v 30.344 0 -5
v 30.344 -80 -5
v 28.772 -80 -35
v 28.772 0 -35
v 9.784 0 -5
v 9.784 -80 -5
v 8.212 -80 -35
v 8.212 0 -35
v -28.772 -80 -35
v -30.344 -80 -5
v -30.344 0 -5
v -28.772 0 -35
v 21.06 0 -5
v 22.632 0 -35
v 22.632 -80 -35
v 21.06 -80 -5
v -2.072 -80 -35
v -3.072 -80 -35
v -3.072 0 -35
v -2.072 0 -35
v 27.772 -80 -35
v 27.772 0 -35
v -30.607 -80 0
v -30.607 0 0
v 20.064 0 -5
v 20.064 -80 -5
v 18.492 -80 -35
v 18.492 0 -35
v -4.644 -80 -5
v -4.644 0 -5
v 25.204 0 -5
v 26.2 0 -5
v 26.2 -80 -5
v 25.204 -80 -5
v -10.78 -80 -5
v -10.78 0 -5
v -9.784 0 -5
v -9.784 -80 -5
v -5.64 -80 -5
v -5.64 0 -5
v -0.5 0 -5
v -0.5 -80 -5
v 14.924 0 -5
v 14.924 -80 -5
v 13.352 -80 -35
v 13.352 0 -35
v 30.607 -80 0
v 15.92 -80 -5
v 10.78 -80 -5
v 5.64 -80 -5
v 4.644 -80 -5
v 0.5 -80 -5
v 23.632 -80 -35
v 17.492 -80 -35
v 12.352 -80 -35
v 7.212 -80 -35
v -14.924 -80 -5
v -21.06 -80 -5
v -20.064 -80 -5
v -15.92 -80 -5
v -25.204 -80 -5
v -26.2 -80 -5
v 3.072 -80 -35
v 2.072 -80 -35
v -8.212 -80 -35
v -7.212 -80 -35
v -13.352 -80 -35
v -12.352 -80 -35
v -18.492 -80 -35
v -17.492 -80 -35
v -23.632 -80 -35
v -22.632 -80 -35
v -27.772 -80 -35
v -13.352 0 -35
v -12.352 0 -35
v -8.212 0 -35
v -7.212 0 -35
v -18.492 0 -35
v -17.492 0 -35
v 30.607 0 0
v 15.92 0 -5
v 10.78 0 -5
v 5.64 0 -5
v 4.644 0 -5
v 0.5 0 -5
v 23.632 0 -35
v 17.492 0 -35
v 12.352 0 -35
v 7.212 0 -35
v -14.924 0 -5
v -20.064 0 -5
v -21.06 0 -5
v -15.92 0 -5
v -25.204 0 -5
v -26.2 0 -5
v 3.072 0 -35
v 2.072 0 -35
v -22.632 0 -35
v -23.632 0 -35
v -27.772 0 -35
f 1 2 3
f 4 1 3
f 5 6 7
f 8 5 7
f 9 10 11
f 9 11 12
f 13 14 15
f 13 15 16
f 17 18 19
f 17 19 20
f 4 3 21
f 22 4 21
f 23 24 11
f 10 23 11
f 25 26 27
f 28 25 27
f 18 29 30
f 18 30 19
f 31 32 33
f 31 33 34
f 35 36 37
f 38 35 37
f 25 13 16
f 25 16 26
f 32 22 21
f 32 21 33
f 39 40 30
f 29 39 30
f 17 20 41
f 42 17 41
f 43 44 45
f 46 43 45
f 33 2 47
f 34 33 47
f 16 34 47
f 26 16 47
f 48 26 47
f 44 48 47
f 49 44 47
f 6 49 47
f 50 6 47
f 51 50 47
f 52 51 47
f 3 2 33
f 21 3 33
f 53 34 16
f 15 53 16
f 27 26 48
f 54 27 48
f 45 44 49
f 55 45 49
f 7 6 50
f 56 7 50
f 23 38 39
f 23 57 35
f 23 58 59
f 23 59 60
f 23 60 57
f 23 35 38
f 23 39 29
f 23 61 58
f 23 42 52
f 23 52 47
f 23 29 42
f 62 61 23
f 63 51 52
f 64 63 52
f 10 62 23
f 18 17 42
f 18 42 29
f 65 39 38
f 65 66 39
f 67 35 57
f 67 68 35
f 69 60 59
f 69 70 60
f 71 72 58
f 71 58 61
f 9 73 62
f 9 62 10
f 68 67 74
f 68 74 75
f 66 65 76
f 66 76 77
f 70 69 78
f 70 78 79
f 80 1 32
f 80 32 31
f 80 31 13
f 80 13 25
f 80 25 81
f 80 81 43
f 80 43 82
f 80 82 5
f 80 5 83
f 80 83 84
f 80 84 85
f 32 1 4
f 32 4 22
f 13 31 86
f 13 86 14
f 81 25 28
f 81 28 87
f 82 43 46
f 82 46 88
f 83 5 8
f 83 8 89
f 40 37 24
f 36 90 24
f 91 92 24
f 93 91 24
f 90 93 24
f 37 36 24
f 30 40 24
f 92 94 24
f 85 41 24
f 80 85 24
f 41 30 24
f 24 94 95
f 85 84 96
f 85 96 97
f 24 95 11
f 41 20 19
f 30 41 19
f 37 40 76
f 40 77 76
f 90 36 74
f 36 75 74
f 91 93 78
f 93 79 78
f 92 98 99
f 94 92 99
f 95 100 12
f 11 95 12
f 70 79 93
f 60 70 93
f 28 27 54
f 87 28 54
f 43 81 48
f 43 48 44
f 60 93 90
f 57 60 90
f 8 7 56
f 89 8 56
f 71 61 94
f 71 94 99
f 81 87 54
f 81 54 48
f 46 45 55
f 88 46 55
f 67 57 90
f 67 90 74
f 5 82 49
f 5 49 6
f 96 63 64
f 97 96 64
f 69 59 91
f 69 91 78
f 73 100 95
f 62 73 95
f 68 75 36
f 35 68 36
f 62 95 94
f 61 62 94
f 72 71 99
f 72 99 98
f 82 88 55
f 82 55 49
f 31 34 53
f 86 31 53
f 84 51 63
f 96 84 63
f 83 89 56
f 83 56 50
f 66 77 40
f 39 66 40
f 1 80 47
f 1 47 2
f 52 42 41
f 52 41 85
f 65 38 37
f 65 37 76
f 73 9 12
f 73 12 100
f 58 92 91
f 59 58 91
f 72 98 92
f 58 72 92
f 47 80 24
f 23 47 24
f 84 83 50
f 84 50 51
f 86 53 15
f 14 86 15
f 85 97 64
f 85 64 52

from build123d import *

# Parameters (mm, degrees)
BOSS_EXTRUDE1_DEPTH = 80


with BuildPart() as part:
    # Sketch1 → Boss-Extrude1 (new body)
    with BuildSketch(Plane(origin=(0, 0, 0), x_dir=(1, 0, 0), z_dir=(0, 1, 0))):
        Polygon((0, 5), (0, 0), (30.606505653, 0), (30.344466757, 5), (28.772233378, 35), (27.772233378, 35), (26.2, 5), (25.704466757, 5), (25.7, 5), (25.204466757, 5), (23.632233378, 35), (22.632233378, 35), (21.06, 5), (20.564466757, 5), (20.56, 5), (20.064466757, 5), (18.492233378, 35), (17.492233378, 35), (15.92, 5), (15.424466757, 5), (15.42, 5), (14.924466757, 5), (13.352233378, 35), (12.352233378, 35), (10.78, 5), (10.284466757, 5), (10.28, 5), (9.784466757, 5), (8.212233378, 35), (7.212233378, 35), (5.64, 5), (5.144466757, 5), (5.14, 5), (4.644466757, 5), (3.072233378, 35), (2.072233378, 35), (0.5, 5), align=None)
    boss_extrude1 = extrude(amount=-BOSS_EXTRUDE1_DEPTH)

    # Mirror1: Boss-Extrude1 across plane
    add(boss_extrude1.mirror(Plane(origin=(0, -80, 0), x_dir=(0, 0, 1), z_dir=(1, 0, 0))))


solid = part.part
